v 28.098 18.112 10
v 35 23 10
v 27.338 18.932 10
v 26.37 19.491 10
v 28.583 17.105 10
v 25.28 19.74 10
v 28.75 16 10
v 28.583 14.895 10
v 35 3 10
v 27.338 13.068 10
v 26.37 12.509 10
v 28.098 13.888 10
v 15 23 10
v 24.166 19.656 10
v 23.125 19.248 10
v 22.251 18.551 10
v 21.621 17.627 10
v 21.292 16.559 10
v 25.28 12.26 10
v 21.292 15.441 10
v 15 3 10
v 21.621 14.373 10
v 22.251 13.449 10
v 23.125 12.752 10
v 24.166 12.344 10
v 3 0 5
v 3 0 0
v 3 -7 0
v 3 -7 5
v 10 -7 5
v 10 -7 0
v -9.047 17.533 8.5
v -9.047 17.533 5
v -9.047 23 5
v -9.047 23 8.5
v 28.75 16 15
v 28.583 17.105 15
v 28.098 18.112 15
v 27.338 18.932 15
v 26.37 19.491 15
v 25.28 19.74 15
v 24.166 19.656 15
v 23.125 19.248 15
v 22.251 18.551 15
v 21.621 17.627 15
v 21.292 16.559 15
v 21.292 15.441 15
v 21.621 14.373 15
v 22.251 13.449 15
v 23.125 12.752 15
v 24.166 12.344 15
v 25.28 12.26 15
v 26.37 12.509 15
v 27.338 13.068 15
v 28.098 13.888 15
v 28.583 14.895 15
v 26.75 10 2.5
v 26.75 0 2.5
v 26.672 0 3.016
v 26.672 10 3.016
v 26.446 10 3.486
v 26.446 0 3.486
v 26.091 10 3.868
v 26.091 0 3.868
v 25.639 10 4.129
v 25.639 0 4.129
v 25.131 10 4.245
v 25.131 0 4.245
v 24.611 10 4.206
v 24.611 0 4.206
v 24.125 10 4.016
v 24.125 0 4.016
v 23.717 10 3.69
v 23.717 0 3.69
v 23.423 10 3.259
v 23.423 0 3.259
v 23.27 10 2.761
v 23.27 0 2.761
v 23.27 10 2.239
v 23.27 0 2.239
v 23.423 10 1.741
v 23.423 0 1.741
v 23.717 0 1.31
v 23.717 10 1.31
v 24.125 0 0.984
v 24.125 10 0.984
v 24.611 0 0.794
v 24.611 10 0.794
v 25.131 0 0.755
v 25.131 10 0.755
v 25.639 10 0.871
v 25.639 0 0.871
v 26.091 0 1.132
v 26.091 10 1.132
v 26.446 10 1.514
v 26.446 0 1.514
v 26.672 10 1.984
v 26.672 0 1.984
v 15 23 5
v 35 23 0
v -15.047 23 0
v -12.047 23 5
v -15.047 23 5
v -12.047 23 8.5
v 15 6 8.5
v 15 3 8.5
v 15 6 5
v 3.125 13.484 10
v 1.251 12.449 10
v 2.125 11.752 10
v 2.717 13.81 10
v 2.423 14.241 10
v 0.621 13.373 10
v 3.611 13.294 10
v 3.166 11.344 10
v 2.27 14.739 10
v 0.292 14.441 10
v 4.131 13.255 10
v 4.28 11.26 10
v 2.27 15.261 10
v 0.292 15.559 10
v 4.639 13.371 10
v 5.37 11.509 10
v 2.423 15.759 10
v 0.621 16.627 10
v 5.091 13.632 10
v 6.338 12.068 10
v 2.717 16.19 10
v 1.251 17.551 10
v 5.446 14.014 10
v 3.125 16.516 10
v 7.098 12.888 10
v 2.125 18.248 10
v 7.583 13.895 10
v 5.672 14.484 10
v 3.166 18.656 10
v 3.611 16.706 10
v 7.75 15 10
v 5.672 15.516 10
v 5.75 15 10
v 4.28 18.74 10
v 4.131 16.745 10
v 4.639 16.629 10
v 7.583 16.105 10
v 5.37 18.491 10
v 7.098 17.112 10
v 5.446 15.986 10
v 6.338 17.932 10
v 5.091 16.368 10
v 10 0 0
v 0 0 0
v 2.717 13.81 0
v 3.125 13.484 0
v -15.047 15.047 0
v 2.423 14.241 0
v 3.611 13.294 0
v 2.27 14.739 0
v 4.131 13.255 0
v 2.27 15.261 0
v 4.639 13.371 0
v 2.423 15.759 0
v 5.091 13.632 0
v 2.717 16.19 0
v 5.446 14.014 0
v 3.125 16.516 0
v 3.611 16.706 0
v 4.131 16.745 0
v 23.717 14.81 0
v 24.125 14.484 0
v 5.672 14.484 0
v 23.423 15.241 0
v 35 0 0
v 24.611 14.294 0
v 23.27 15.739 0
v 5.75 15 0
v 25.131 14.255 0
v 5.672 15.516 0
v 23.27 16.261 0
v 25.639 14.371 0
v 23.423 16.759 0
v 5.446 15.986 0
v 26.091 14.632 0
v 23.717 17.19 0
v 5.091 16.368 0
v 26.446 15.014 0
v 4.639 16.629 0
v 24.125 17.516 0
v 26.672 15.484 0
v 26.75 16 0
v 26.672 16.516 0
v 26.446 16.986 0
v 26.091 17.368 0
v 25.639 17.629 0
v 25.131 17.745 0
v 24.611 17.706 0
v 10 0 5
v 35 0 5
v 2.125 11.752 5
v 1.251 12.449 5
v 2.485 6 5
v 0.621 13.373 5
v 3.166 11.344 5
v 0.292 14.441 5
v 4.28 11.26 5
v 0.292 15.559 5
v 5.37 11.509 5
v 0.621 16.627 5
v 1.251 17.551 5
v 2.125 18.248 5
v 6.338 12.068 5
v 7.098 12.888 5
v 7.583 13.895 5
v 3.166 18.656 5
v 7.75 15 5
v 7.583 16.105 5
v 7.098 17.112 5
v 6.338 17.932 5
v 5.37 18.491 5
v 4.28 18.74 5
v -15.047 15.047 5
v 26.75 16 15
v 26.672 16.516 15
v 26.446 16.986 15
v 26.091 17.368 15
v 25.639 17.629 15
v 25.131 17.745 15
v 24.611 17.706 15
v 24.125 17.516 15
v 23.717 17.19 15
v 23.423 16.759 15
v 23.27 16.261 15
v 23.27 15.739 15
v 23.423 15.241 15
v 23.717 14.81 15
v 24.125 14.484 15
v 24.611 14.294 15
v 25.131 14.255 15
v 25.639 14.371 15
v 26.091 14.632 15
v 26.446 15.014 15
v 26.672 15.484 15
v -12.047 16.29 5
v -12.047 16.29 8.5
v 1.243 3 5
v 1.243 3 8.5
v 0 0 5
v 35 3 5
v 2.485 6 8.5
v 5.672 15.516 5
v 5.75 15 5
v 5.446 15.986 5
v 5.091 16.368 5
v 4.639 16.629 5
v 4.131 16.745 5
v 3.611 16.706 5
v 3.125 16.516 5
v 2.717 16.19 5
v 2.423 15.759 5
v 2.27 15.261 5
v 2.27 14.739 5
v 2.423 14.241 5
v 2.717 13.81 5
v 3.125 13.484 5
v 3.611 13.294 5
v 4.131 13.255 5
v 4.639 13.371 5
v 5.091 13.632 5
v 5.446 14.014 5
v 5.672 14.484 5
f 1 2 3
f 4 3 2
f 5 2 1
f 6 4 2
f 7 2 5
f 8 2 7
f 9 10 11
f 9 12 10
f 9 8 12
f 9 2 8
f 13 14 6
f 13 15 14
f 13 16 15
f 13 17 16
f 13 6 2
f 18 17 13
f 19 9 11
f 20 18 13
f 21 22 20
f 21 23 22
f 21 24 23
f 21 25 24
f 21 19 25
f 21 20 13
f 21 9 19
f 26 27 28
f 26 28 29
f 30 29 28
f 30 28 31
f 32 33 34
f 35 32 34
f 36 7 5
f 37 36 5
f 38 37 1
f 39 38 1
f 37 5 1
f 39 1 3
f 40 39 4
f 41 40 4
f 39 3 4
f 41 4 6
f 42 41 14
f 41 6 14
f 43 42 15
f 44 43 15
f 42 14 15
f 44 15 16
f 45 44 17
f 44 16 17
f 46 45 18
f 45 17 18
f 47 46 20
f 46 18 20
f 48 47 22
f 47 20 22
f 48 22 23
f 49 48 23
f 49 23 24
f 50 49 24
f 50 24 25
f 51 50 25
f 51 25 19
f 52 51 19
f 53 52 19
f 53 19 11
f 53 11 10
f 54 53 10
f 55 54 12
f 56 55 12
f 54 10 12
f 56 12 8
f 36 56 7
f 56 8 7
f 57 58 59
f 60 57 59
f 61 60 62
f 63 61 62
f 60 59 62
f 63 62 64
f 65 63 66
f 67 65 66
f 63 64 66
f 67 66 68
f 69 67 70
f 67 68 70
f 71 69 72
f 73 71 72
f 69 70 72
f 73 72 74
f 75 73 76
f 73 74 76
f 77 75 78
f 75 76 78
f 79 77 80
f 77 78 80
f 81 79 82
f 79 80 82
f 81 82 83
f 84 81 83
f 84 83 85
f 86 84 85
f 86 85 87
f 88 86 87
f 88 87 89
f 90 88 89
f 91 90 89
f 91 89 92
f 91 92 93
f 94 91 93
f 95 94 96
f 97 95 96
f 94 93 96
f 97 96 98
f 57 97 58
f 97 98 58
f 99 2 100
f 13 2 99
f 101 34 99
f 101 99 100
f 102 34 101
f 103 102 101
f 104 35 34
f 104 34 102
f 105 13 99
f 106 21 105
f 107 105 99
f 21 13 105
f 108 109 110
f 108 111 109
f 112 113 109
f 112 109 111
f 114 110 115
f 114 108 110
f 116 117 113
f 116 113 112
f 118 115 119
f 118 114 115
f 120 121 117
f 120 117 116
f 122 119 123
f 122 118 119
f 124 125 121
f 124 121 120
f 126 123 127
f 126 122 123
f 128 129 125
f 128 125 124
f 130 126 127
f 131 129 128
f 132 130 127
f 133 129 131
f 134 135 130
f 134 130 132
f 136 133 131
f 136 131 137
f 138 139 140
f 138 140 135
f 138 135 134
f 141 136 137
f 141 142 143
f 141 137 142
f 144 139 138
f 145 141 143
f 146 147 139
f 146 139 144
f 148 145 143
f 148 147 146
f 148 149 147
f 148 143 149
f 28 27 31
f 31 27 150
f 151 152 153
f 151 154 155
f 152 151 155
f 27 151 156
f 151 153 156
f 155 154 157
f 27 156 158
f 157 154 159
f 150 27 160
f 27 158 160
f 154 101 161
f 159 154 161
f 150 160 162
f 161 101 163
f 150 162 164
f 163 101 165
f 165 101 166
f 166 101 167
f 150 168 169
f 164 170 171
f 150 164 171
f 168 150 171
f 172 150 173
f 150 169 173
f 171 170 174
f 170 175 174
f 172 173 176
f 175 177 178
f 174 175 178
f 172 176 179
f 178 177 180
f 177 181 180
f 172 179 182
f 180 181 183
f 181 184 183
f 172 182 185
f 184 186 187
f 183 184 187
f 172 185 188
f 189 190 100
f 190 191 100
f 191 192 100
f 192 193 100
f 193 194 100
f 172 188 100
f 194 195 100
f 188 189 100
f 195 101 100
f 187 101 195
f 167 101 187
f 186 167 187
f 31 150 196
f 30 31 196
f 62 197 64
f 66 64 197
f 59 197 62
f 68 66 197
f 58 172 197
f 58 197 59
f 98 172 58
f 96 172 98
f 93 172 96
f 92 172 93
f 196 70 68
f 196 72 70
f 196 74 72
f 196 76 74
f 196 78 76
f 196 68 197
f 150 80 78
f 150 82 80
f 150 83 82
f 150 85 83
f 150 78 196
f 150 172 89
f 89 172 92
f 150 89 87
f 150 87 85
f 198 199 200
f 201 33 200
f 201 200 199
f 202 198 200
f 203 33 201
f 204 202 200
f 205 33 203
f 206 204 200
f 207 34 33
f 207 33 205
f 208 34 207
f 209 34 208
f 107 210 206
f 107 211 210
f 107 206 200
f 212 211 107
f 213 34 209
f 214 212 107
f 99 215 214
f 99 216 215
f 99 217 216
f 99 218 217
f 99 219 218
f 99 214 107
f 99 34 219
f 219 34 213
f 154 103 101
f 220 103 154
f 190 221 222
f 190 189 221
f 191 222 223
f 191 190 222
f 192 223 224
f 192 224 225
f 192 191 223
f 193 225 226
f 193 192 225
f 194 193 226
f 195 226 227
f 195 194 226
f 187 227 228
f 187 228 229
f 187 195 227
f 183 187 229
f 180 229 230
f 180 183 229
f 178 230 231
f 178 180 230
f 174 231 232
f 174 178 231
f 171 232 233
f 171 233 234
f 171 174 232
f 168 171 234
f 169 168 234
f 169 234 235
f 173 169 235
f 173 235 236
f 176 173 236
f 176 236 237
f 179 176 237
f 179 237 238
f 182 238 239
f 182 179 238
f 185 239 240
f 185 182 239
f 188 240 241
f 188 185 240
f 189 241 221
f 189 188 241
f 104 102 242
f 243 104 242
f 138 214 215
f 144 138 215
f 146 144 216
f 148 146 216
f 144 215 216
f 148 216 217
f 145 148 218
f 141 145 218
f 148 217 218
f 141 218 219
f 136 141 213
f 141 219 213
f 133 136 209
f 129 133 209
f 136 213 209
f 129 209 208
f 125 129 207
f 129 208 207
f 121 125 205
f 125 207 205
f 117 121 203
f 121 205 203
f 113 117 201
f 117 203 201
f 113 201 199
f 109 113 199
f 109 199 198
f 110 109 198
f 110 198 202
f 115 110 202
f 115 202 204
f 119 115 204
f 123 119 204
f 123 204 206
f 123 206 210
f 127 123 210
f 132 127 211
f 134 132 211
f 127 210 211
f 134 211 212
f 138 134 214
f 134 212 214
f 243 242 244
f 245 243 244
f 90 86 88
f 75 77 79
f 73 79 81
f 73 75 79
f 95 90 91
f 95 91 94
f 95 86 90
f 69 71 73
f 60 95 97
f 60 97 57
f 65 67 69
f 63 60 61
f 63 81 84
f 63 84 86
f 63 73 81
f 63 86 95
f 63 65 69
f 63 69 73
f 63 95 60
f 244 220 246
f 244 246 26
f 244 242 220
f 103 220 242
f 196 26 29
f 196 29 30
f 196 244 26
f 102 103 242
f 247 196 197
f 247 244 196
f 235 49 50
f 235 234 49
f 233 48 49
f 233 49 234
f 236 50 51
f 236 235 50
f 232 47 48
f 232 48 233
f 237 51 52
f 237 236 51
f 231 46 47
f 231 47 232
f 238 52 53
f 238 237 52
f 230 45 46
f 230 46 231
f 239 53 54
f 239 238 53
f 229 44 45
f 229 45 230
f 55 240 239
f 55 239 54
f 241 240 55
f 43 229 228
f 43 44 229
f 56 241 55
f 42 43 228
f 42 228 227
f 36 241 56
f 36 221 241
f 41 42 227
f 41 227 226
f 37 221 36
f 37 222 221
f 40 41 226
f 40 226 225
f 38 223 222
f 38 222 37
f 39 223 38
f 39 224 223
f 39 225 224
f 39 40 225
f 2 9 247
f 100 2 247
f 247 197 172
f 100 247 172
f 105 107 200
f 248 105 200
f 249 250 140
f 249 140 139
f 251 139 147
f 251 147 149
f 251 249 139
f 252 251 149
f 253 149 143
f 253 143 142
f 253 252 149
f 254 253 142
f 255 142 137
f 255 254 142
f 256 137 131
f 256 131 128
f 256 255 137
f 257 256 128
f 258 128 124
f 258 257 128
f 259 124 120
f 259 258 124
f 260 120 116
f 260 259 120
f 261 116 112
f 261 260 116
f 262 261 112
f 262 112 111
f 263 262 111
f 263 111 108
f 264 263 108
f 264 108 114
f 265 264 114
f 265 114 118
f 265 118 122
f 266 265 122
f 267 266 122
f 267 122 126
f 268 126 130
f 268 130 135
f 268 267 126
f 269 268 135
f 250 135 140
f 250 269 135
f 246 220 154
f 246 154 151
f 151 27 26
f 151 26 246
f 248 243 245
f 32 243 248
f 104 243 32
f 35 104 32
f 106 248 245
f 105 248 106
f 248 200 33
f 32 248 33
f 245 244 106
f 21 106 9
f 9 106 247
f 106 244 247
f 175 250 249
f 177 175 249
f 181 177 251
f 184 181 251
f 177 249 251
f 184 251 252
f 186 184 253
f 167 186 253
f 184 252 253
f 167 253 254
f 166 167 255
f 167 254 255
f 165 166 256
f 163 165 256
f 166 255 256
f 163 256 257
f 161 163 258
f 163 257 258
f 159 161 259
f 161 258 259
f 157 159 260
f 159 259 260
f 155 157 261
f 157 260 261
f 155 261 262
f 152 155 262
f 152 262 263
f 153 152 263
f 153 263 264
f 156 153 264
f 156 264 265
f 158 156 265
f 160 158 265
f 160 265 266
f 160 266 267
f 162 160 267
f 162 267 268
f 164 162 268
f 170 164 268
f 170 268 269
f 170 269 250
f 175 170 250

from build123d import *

# Parameters (mm, degrees)
BOSS_EXTRUDE1_DEPTH = 23
SKETCH2_R           = 1.75
CUT_EXTRUDE1_DEPTH  = 10
SKETCH4_W           = 7
SKETCH4_H           = 5
BOSS_EXTRUDE2_DEPTH = 7
SKETCH6_R           = 3.75
SKETCH6_R_2         = 1.75
BOSS_EXTRUDE3_DEPTH = 5
SKETCH7_R           = 3.75
SKETCH7_R_2         = 1.75
BOSS_EXTRUDE4_DEPTH = 5
BOSS_EXTRUDE5_DEPTH = 5
BOSS_EXTRUDE6_DEPTH = 3.5
SKETCH3_R           = 1.75
CUT_EXTRUDE2_DEPTH  = 10
SKETCH12_W          = 5
SKETCH12_H          = 3
CUT_EXTRUDE3_DEPTH  = 20


with BuildPart() as part:
    # Sketch1 → Boss-Extrude1 (new body)
    with BuildSketch(Plane(origin=(0, 0, 0), x_dir=(1, 0, 0), z_dir=(0, 1, 0))):
        Polygon((18, 0), (22, 0), (35, 0), (35, -5), (35, -10), (15, -10), (15, -5), (0, -5), (0, 0), align=None)
    extrude(amount=BOSS_EXTRUDE1_DEPTH)

    # Sketch2 → Cut-Extrude1 (cut)
    with BuildSketch(Plane.XY.offset(10)):
        with Locations((4, 15)):
            Circle(SKETCH2_R)
        with Locations((25, 16)):
            Circle(SKETCH2_R)
    extrude(amount=-CUT_EXTRUDE1_DEPTH, mode=Mode.SUBTRACT)

    # Sketch4 → Boss-Extrude2 (add)
    with BuildSketch(Plane.XZ):
        with Locations((6.5, 2.5)):
            Rectangle(SKETCH4_W, SKETCH4_H)
    extrude(amount=BOSS_EXTRUDE2_DEPTH)

    # Sketch6 → Boss-Extrude3 (add)
    with BuildSketch(Plane.XY.offset(5)):
        with Locations((4, 15)):
            Circle(SKETCH6_R)
        with Locations((4, 15)):
            Circle(SKETCH6_R_2, mode=Mode.SUBTRACT)
    extrude(amount=BOSS_EXTRUDE3_DEPTH)

    # Sketch7 → Boss-Extrude4 (add)
    with BuildSketch(Plane.XY.offset(10)):
        with Locations((25, 16)):
            Circle(SKETCH7_R)
        with Locations((25, 16)):
            Circle(SKETCH7_R_2, mode=Mode.SUBTRACT)
    extrude(amount=BOSS_EXTRUDE4_DEPTH)

    # Sketch10 → Boss-Extrude5 (add)
    with BuildSketch(Plane.XY.offset(5)):
        Polygon((0, 23), (-15.047232304, 23), (-15.047232304, 15.047232304), (0, 0), align=None)
    extrude(amount=-BOSS_EXTRUDE5_DEPTH)

    # Sketch11 → Boss-Extrude6 (add)
    with BuildSketch(Plane.XY.offset(5)):
        Polygon((-12.047232304, 23), (-12.047232304, 16.289872991), (1.242640687, 3), (15, 3), (15, 6), (2.485281374, 6), (-9.047232304, 17.532513678), (-9.047232304, 23), align=None)
    extrude(amount=BOSS_EXTRUDE6_DEPTH)

    # Sketch3 → Cut-Extrude2 (cut)
    with BuildSketch(Plane.XZ):
        with Locations((25, 2.5)):
            Circle(SKETCH3_R)
    extrude(amount=-CUT_EXTRUDE2_DEPTH, mode=Mode.SUBTRACT)

    # Sketch12 → Cut-Extrude3 (cut)
    with BuildSketch(Plane.ZY.offset(-15)):
        with Locations((7.5, 1.5)):
            Rectangle(SKETCH12_W, SKETCH12_H)
    extrude(amount=-CUT_EXTRUDE3_DEPTH, mode=Mode.SUBTRACT)


solid = part.part
